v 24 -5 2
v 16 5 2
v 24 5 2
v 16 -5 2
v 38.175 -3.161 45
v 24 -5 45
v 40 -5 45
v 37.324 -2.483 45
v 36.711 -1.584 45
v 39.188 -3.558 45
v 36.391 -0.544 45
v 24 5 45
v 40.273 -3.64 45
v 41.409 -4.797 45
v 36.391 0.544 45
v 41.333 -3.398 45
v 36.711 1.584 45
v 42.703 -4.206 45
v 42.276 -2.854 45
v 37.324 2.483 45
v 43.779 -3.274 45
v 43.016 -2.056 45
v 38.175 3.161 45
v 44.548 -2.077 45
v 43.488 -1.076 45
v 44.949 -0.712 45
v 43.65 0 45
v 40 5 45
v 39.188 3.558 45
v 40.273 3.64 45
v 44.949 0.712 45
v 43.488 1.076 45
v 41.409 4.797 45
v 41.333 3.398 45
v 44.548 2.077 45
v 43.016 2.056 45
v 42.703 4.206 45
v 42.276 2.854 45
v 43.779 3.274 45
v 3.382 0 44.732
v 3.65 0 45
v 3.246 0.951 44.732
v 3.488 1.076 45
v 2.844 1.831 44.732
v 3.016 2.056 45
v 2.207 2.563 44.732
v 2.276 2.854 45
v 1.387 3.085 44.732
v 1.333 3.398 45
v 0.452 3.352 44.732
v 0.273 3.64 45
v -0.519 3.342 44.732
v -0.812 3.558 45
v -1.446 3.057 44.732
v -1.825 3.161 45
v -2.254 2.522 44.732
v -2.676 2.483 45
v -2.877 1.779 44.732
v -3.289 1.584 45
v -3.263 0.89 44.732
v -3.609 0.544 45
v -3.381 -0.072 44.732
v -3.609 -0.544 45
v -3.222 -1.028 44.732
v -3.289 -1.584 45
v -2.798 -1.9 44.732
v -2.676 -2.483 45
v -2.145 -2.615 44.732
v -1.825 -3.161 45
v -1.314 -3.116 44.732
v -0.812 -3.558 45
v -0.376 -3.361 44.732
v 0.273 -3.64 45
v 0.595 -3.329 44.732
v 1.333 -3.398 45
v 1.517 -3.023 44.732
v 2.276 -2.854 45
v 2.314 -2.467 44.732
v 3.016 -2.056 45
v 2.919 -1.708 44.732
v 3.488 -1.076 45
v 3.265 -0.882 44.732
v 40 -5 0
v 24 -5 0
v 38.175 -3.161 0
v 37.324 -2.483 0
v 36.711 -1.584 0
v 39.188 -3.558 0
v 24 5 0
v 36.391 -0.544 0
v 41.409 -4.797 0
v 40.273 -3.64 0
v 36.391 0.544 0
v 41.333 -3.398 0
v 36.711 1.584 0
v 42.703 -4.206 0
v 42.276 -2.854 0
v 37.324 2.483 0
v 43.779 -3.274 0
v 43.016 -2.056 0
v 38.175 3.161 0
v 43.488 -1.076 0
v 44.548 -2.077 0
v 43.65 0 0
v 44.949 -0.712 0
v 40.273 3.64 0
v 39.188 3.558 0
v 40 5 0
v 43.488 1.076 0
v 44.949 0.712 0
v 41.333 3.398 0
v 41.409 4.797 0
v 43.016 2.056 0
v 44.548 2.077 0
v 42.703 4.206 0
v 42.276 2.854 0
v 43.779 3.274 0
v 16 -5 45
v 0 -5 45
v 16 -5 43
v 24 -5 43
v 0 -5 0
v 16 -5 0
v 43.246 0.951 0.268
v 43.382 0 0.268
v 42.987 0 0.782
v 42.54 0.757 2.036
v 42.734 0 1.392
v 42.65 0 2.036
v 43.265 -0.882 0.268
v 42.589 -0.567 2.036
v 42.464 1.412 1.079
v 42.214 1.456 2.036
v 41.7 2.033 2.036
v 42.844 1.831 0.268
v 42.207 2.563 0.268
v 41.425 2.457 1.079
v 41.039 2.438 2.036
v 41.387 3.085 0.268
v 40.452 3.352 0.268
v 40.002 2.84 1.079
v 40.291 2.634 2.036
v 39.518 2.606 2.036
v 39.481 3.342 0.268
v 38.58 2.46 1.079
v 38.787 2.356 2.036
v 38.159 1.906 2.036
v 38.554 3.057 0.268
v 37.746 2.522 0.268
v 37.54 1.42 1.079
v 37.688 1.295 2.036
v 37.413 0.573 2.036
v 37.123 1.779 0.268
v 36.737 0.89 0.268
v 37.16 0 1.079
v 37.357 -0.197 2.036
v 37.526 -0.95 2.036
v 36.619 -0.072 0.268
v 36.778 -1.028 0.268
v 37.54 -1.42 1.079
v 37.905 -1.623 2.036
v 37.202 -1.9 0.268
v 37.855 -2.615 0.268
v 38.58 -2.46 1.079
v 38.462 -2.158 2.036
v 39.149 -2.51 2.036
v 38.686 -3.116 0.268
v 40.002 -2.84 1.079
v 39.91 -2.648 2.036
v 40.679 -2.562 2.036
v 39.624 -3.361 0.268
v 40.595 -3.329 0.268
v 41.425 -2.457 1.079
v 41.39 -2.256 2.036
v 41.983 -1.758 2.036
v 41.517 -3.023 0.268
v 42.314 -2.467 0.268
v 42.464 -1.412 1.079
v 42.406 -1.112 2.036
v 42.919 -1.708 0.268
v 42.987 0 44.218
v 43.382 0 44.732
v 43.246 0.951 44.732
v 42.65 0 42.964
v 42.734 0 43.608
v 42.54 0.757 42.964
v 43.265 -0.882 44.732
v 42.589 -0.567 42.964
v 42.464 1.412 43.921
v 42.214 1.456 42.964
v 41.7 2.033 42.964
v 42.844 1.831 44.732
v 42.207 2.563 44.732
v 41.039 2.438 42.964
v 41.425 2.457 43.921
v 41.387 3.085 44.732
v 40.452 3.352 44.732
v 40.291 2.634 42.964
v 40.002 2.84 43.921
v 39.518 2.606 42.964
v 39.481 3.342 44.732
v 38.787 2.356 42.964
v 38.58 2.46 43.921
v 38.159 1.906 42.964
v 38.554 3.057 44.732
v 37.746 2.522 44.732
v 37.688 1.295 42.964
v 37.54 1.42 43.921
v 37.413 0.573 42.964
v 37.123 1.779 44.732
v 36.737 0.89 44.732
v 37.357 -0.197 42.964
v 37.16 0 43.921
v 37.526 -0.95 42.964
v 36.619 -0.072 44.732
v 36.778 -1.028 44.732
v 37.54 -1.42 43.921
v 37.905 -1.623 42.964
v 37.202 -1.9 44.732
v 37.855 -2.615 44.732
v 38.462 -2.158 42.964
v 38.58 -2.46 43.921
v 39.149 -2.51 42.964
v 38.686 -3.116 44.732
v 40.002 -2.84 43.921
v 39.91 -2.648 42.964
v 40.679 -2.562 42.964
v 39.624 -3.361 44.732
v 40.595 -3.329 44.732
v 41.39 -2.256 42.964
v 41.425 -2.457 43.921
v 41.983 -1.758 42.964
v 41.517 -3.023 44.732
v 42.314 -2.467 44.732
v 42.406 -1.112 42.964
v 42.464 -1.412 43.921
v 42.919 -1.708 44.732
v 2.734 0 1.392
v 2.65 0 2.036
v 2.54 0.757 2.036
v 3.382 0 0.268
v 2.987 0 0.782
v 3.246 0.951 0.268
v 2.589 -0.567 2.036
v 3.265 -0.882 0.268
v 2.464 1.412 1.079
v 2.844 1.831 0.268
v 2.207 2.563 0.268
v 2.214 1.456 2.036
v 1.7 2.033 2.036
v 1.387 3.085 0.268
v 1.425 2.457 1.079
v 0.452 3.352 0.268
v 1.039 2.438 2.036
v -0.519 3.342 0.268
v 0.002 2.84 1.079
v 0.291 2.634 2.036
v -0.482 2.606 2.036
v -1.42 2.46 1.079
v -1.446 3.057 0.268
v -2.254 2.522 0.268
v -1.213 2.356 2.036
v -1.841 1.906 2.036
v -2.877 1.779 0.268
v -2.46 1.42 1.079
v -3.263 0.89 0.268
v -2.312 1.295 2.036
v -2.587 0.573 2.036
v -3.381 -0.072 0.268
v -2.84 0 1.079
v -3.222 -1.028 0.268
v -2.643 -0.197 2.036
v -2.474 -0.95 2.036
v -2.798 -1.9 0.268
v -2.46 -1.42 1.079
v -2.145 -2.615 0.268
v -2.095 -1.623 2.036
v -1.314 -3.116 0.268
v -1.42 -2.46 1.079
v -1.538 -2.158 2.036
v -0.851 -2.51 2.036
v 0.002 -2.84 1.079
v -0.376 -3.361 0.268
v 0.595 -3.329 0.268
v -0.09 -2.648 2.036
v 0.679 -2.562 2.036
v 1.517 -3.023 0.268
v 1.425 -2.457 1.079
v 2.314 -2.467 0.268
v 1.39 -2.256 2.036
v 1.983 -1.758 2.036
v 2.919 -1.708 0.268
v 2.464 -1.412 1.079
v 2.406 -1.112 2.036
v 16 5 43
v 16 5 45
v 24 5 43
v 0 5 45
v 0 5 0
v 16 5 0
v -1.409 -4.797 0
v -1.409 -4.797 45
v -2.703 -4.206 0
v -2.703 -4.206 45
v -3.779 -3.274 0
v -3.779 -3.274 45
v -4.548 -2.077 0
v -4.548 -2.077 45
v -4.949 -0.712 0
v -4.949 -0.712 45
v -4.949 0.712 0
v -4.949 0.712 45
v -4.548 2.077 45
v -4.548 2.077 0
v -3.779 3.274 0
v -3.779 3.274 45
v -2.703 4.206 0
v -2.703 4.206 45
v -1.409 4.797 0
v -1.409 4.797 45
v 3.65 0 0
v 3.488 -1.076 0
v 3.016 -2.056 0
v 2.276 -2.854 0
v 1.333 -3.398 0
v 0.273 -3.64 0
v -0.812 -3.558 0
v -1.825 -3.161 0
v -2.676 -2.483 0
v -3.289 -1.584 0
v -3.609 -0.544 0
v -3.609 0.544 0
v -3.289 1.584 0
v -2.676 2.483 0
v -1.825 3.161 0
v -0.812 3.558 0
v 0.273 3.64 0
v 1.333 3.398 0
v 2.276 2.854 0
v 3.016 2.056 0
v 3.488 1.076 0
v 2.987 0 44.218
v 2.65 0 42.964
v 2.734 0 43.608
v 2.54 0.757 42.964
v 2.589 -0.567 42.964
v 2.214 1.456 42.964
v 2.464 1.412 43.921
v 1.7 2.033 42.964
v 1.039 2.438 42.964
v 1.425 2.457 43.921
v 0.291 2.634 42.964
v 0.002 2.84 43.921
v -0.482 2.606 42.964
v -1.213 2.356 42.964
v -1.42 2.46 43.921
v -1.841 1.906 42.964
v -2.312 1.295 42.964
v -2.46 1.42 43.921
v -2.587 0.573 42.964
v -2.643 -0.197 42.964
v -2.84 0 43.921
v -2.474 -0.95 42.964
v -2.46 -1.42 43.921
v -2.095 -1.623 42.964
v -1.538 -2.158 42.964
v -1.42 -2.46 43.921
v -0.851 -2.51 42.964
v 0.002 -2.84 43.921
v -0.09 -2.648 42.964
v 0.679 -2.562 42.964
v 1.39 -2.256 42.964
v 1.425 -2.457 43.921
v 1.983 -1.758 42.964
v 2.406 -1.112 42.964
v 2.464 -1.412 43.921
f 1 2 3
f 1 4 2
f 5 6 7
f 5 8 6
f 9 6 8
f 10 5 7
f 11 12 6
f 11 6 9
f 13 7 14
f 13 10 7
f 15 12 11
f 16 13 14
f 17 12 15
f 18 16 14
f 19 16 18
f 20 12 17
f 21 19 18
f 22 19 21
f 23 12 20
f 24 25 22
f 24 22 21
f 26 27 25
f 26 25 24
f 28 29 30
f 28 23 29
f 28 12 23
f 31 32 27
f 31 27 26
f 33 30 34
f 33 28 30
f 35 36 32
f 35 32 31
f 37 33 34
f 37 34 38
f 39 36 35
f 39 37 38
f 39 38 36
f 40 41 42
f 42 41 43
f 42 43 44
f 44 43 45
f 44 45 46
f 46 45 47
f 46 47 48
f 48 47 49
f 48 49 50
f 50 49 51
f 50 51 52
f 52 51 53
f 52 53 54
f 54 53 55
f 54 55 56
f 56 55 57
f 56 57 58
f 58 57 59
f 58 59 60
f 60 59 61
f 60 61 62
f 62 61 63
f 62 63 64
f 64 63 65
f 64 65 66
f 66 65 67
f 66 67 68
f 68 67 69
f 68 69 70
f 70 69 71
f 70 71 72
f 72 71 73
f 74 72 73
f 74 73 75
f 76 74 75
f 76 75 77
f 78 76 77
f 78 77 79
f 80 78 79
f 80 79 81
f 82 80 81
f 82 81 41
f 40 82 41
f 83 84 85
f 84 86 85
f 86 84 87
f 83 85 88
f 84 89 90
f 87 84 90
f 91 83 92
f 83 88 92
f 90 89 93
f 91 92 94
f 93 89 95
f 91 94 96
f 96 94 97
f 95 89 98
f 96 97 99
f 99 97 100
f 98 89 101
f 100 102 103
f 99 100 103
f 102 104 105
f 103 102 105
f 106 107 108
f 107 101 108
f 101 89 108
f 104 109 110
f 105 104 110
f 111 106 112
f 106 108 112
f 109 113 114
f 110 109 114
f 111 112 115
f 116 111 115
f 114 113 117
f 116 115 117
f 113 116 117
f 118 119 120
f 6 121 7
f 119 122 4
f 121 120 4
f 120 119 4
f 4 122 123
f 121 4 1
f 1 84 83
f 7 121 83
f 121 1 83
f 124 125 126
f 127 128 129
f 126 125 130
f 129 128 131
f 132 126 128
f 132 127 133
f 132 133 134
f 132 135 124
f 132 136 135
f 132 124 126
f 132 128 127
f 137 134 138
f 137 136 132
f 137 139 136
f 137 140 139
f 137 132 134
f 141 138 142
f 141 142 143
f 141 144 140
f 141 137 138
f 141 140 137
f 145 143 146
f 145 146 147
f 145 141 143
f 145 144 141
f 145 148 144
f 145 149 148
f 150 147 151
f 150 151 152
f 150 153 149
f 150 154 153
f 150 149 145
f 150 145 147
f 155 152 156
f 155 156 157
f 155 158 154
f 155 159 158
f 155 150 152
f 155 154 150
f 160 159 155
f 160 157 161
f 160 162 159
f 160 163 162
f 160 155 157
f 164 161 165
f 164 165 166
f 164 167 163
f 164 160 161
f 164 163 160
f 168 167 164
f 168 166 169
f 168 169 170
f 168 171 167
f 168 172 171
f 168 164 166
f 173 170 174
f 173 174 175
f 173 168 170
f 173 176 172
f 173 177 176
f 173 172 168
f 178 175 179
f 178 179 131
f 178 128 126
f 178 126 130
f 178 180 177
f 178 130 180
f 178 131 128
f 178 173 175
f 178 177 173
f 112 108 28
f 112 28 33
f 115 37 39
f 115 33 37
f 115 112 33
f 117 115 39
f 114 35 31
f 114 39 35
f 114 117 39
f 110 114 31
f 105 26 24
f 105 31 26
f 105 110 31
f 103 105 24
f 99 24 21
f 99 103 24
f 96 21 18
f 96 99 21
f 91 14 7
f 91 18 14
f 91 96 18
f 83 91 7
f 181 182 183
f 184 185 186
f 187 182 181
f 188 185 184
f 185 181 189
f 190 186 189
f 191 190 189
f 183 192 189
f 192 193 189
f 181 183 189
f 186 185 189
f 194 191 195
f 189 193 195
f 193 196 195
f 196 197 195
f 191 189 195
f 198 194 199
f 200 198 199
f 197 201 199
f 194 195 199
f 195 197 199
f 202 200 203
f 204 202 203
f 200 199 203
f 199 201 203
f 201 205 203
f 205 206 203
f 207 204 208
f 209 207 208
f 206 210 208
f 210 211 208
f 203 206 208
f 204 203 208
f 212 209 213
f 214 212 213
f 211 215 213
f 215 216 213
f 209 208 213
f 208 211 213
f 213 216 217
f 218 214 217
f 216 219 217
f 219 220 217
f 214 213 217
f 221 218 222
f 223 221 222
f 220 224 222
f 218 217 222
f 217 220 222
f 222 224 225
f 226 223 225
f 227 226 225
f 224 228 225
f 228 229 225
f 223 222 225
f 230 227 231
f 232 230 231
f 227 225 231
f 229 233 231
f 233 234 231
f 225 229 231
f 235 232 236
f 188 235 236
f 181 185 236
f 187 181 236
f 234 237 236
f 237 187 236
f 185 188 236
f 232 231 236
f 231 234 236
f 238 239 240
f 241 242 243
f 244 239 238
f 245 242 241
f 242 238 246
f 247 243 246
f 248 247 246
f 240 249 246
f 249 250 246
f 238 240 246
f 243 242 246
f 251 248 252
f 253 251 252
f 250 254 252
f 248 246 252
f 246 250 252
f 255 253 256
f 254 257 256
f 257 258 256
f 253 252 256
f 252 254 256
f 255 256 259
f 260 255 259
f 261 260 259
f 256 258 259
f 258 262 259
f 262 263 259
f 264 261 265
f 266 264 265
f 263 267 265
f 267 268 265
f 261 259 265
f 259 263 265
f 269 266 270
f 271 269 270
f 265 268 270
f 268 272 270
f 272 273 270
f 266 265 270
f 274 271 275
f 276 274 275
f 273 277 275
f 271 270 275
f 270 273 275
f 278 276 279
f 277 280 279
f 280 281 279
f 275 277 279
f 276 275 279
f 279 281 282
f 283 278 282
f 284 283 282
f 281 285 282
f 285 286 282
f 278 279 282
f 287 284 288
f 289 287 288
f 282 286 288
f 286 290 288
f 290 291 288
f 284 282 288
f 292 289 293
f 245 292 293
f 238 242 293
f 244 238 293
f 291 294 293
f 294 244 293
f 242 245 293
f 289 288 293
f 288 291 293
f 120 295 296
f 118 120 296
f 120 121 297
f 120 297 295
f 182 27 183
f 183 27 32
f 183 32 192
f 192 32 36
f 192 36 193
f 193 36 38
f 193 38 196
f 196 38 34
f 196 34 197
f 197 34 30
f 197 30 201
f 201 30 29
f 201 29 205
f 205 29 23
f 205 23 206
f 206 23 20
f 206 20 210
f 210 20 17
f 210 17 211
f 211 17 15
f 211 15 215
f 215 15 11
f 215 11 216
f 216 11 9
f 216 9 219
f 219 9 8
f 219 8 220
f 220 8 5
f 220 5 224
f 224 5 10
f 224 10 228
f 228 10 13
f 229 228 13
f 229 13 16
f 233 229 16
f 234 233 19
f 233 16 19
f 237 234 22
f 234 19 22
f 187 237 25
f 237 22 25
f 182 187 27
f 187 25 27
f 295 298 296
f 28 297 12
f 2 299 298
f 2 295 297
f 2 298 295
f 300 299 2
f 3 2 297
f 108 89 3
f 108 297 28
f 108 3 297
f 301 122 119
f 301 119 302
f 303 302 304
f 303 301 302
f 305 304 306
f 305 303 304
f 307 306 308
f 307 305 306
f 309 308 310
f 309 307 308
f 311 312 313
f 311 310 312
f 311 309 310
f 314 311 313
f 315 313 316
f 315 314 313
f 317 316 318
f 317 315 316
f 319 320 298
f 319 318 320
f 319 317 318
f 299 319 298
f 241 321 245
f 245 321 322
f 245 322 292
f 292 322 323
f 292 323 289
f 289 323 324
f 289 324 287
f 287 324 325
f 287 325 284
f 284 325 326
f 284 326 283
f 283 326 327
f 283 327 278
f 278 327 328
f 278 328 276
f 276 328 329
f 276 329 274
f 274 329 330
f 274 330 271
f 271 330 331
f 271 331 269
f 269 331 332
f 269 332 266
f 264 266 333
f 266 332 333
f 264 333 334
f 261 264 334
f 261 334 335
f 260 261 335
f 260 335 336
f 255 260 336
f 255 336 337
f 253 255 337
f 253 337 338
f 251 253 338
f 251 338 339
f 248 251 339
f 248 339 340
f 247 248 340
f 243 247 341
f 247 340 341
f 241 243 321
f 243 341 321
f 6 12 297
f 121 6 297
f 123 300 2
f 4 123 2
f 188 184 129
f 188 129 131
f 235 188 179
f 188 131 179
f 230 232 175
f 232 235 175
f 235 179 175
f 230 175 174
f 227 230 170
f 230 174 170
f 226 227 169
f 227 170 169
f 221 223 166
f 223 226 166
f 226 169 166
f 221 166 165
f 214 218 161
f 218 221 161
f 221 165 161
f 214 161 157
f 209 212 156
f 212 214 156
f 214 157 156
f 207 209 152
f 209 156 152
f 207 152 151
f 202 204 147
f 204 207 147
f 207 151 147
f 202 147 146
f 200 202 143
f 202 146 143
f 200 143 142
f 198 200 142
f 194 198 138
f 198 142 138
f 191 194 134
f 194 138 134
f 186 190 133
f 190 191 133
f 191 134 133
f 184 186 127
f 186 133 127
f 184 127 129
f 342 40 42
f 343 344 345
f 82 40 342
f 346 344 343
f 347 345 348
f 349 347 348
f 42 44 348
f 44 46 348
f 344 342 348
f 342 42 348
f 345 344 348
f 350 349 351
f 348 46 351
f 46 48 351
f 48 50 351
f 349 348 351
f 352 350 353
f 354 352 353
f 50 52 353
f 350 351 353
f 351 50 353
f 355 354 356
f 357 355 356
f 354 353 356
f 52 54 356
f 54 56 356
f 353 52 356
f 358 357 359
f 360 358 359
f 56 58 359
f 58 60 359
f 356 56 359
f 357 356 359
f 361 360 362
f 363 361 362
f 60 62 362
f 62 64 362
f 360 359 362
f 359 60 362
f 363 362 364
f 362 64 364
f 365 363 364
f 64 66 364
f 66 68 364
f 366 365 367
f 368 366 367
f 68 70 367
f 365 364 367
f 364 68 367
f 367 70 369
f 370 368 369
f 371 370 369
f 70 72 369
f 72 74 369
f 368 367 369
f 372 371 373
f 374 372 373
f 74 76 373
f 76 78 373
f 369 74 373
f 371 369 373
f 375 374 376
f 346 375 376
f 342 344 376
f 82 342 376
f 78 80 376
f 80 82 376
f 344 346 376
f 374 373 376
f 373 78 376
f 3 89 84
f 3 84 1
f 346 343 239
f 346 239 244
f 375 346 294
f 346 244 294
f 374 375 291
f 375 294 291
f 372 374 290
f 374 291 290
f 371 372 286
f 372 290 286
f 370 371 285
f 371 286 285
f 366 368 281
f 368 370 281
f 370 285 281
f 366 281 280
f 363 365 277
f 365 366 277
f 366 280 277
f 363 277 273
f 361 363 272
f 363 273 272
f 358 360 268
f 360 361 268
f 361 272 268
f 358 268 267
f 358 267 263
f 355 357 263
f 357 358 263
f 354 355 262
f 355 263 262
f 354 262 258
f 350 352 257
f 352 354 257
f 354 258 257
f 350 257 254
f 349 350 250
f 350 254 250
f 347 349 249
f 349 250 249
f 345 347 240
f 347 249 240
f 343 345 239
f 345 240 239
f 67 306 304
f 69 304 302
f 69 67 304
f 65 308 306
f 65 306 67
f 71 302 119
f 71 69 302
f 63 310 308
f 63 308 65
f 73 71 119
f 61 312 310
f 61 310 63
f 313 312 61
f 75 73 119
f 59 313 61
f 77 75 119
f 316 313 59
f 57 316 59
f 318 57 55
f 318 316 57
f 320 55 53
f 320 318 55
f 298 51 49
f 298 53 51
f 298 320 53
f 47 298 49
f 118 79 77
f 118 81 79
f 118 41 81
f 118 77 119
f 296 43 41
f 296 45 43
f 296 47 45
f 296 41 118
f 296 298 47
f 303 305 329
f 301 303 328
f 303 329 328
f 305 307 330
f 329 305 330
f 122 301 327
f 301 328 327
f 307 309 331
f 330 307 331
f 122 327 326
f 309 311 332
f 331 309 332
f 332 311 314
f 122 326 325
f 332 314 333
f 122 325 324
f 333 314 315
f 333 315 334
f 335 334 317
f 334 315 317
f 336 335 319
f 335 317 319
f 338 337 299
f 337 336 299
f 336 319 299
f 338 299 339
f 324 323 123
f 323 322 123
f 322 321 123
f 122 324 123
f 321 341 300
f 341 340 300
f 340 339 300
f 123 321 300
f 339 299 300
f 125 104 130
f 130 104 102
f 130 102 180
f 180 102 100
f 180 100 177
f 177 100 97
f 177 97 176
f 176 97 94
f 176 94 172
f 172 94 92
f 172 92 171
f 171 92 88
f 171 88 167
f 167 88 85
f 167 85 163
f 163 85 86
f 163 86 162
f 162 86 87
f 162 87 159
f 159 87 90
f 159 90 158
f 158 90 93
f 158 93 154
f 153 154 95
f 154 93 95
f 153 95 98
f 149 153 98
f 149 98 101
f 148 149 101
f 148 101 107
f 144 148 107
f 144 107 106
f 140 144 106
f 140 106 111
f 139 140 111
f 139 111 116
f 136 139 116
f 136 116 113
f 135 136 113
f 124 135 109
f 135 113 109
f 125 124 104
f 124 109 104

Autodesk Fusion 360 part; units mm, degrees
sketch "Sketch1" plane through (0, 0, 0) normal (0, 0, 1) x (1, 0, 0)
  circle A0 centre (0, 0) radius 2.65
  circle A1 centre (0, 0) radius 5
  line L0 (0, 0) -> (40, 0) construction
  circle A2 centre (40, 0) radius 2.65
  circle A3 centre (40, 0) radius 5
  line L1 (0, -5) -> (40, -5)
  line L2 (0, 5) -> (40, 5)
  dimension "d3" = 5.3
  dimension "d4" = 10
  dimension "d5" = 40
  dimension "d6" = 5.3
  dimension "d7" = 10
extrude "Extrude1" add sketch "Sketch1" along normal blind 45
chamfer "Chamfer1" distance 1 angle 45 2 edges at (-2.4707, 0.9583, 45) (37.5293, 0.9583, 45)
fillet "Fillet1" radius 2.5 2 edges at (-2.4707, 0.9583, 44) (37.5293, 0.9583, 44)
ref_plane "WorkPlane1" through (0, 0, 0) normal (1, 0, 0) x (0, 1, 0)
chamfer "Chamfer2" distance 1 angle 45 2 edges at (-2.4707, 0.9583, 0) (37.5293, 0.9583, 0)
sketch "Sketch2" plane through (0, -5, 0) normal (0, -1, 0) x (1, 0, 0)
  line L0 (0, 0) -> (40, 0)
  line L1 (40, 0) -> (40, 45)
  line L2 (40, 45) -> (0, 45)
  line L3 (0, 45) -> (0, 0)
  line L4 (20, 45) -> (20, 43)
  line L5 (20, 43) -> (16, 43)
  line L6 (16, 43) -> (16, 45)
  line L7 (16, 45) -> (20, 45)
  line L8 (20, 45) -> (20, 43)
  line L9 (20, 45) -> (24, 45)
  line L10 (24, 45) -> (24, 43)
  line L11 (24, 43) -> (20, 43)
  line L12 (20, 43) -> (20, 45)
  line L13 (20, 0) -> (16, 0)
  line L14 (16, 0) -> (16, 2)
  line L15 (16, 2) -> (20, 2)
  line L16 (20, 2) -> (20, 0)
  line L17 (20, 0) -> (24, 0)
  line L18 (24, 0) -> (24, 2)
  line L19 (24, 2) -> (20, 2)
  line L20 (20, 2) -> (20, 0)
  dimension "d15" = 2
  dimension "d16" = 4
  dimension "d17" = 4
  dimension "d18" = 4
  dimension "d19" = 2
  dimension "d20" = 4
  dimension "d21" = 2
extrude "Extrude2" cut sketch "Sketch2" against normal blind 14 contours L0 L13 L14 L15 L16 L20 | L0 L16 L17 L18 L19 L20 | L2 L4 L5 L6 L7 L8 L12 | L2 L4 L8 L9 L10 L11 L12
fillet "Fillet2" radius 2.5 2 edges at (-2.4707, -0.9583, 1) (37.5293, -0.9583, 1)
equation "spacing = 40 mm" comment "babyBullet=40mm"
equation "holeSize = 5.30 mm" comment "resize for tollerance"
equation "d3 = holeSize"
equation "d5 = spacing"
equation "d6 = holeSize"
